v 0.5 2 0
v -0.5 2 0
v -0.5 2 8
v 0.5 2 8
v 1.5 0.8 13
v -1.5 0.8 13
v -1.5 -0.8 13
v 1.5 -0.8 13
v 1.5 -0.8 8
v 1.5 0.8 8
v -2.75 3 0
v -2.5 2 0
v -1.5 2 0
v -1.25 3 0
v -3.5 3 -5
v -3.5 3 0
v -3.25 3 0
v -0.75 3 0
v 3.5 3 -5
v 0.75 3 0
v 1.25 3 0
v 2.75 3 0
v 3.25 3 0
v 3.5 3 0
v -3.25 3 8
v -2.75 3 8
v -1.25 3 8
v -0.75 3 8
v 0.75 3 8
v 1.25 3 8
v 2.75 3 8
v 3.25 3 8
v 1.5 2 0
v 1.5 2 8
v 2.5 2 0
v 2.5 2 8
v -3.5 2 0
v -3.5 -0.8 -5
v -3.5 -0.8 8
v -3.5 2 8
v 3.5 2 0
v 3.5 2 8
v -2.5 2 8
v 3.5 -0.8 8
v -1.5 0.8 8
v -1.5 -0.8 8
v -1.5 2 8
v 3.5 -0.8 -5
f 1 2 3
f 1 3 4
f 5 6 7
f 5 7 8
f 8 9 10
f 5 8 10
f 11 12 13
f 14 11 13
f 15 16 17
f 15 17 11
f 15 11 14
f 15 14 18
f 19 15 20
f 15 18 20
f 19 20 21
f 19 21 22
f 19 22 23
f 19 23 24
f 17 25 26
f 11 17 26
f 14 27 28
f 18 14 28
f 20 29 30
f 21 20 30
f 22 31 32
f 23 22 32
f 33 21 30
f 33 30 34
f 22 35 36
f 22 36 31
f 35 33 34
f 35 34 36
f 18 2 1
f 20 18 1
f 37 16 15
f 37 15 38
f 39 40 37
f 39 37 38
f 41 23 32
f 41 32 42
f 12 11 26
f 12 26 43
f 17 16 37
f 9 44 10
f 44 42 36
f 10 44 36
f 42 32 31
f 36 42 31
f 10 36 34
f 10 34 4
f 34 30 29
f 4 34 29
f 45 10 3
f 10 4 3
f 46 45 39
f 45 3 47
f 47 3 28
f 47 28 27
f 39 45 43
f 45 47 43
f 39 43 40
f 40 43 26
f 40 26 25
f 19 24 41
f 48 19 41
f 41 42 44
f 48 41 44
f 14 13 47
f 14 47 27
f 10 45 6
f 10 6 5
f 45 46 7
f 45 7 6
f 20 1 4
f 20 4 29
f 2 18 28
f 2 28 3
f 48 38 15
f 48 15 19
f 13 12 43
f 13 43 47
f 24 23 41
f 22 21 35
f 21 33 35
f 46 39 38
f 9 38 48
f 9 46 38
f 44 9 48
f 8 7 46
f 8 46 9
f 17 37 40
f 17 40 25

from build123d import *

# Parameters (mm, degrees)
PAD_DEPTH    = 8
SKETCH001_W  = 7
SKETCH001_H  = 5
PAD001_DEPTH = 5
SKETCH002_W  = 3
SKETCH002_H  = 1.6
PAD002_DEPTH = 5
SKETCH003_W  = 7
SKETCH003_H  = 1.2
POCKET_DEPTH = 13.001


with BuildPart() as part:
    # Sketch → Pad (new body)
    with BuildSketch(Plane.XY):
        Polygon((-3.5, 2), (-3.25, 3), (-2.75, 3), (-2.5, 2), (-1.5, 2), (-1.25, 3), (-0.75, 3), (-0.5, 2), (0.5, 2), (0.75, 3), (1.25, 3), (1.5, 2), (2.5, 2), (2.75, 3), (3.25, 3), (3.5, 2), (3.5, -2), (-3.5, -2), align=None)
    extrude(amount=PAD_DEPTH)

    # Sketch001 → Pad001 (new body)
    with BuildSketch(Plane(origin=(0, 0, 0), x_dir=(1, 0, 0), z_dir=(0, 0, -1))):
        with Locations((0, -0.5)):
            Rectangle(SKETCH001_W, SKETCH001_H)
    extrude(amount=PAD001_DEPTH)

    # Sketch002 → Pad002 (new body)
    with BuildSketch(Plane.XY.offset(8)):
        Rectangle(SKETCH002_W, SKETCH002_H)
    extrude(amount=PAD002_DEPTH)

    # Sketch003 → Pocket (cut, through all)
    with BuildSketch(Plane.XY.offset(8)):
        with Locations((0, -1.4)):
            Rectangle(SKETCH003_W, SKETCH003_H)
    extrude(amount=-POCKET_DEPTH, mode=Mode.SUBTRACT)


solid = part.part
